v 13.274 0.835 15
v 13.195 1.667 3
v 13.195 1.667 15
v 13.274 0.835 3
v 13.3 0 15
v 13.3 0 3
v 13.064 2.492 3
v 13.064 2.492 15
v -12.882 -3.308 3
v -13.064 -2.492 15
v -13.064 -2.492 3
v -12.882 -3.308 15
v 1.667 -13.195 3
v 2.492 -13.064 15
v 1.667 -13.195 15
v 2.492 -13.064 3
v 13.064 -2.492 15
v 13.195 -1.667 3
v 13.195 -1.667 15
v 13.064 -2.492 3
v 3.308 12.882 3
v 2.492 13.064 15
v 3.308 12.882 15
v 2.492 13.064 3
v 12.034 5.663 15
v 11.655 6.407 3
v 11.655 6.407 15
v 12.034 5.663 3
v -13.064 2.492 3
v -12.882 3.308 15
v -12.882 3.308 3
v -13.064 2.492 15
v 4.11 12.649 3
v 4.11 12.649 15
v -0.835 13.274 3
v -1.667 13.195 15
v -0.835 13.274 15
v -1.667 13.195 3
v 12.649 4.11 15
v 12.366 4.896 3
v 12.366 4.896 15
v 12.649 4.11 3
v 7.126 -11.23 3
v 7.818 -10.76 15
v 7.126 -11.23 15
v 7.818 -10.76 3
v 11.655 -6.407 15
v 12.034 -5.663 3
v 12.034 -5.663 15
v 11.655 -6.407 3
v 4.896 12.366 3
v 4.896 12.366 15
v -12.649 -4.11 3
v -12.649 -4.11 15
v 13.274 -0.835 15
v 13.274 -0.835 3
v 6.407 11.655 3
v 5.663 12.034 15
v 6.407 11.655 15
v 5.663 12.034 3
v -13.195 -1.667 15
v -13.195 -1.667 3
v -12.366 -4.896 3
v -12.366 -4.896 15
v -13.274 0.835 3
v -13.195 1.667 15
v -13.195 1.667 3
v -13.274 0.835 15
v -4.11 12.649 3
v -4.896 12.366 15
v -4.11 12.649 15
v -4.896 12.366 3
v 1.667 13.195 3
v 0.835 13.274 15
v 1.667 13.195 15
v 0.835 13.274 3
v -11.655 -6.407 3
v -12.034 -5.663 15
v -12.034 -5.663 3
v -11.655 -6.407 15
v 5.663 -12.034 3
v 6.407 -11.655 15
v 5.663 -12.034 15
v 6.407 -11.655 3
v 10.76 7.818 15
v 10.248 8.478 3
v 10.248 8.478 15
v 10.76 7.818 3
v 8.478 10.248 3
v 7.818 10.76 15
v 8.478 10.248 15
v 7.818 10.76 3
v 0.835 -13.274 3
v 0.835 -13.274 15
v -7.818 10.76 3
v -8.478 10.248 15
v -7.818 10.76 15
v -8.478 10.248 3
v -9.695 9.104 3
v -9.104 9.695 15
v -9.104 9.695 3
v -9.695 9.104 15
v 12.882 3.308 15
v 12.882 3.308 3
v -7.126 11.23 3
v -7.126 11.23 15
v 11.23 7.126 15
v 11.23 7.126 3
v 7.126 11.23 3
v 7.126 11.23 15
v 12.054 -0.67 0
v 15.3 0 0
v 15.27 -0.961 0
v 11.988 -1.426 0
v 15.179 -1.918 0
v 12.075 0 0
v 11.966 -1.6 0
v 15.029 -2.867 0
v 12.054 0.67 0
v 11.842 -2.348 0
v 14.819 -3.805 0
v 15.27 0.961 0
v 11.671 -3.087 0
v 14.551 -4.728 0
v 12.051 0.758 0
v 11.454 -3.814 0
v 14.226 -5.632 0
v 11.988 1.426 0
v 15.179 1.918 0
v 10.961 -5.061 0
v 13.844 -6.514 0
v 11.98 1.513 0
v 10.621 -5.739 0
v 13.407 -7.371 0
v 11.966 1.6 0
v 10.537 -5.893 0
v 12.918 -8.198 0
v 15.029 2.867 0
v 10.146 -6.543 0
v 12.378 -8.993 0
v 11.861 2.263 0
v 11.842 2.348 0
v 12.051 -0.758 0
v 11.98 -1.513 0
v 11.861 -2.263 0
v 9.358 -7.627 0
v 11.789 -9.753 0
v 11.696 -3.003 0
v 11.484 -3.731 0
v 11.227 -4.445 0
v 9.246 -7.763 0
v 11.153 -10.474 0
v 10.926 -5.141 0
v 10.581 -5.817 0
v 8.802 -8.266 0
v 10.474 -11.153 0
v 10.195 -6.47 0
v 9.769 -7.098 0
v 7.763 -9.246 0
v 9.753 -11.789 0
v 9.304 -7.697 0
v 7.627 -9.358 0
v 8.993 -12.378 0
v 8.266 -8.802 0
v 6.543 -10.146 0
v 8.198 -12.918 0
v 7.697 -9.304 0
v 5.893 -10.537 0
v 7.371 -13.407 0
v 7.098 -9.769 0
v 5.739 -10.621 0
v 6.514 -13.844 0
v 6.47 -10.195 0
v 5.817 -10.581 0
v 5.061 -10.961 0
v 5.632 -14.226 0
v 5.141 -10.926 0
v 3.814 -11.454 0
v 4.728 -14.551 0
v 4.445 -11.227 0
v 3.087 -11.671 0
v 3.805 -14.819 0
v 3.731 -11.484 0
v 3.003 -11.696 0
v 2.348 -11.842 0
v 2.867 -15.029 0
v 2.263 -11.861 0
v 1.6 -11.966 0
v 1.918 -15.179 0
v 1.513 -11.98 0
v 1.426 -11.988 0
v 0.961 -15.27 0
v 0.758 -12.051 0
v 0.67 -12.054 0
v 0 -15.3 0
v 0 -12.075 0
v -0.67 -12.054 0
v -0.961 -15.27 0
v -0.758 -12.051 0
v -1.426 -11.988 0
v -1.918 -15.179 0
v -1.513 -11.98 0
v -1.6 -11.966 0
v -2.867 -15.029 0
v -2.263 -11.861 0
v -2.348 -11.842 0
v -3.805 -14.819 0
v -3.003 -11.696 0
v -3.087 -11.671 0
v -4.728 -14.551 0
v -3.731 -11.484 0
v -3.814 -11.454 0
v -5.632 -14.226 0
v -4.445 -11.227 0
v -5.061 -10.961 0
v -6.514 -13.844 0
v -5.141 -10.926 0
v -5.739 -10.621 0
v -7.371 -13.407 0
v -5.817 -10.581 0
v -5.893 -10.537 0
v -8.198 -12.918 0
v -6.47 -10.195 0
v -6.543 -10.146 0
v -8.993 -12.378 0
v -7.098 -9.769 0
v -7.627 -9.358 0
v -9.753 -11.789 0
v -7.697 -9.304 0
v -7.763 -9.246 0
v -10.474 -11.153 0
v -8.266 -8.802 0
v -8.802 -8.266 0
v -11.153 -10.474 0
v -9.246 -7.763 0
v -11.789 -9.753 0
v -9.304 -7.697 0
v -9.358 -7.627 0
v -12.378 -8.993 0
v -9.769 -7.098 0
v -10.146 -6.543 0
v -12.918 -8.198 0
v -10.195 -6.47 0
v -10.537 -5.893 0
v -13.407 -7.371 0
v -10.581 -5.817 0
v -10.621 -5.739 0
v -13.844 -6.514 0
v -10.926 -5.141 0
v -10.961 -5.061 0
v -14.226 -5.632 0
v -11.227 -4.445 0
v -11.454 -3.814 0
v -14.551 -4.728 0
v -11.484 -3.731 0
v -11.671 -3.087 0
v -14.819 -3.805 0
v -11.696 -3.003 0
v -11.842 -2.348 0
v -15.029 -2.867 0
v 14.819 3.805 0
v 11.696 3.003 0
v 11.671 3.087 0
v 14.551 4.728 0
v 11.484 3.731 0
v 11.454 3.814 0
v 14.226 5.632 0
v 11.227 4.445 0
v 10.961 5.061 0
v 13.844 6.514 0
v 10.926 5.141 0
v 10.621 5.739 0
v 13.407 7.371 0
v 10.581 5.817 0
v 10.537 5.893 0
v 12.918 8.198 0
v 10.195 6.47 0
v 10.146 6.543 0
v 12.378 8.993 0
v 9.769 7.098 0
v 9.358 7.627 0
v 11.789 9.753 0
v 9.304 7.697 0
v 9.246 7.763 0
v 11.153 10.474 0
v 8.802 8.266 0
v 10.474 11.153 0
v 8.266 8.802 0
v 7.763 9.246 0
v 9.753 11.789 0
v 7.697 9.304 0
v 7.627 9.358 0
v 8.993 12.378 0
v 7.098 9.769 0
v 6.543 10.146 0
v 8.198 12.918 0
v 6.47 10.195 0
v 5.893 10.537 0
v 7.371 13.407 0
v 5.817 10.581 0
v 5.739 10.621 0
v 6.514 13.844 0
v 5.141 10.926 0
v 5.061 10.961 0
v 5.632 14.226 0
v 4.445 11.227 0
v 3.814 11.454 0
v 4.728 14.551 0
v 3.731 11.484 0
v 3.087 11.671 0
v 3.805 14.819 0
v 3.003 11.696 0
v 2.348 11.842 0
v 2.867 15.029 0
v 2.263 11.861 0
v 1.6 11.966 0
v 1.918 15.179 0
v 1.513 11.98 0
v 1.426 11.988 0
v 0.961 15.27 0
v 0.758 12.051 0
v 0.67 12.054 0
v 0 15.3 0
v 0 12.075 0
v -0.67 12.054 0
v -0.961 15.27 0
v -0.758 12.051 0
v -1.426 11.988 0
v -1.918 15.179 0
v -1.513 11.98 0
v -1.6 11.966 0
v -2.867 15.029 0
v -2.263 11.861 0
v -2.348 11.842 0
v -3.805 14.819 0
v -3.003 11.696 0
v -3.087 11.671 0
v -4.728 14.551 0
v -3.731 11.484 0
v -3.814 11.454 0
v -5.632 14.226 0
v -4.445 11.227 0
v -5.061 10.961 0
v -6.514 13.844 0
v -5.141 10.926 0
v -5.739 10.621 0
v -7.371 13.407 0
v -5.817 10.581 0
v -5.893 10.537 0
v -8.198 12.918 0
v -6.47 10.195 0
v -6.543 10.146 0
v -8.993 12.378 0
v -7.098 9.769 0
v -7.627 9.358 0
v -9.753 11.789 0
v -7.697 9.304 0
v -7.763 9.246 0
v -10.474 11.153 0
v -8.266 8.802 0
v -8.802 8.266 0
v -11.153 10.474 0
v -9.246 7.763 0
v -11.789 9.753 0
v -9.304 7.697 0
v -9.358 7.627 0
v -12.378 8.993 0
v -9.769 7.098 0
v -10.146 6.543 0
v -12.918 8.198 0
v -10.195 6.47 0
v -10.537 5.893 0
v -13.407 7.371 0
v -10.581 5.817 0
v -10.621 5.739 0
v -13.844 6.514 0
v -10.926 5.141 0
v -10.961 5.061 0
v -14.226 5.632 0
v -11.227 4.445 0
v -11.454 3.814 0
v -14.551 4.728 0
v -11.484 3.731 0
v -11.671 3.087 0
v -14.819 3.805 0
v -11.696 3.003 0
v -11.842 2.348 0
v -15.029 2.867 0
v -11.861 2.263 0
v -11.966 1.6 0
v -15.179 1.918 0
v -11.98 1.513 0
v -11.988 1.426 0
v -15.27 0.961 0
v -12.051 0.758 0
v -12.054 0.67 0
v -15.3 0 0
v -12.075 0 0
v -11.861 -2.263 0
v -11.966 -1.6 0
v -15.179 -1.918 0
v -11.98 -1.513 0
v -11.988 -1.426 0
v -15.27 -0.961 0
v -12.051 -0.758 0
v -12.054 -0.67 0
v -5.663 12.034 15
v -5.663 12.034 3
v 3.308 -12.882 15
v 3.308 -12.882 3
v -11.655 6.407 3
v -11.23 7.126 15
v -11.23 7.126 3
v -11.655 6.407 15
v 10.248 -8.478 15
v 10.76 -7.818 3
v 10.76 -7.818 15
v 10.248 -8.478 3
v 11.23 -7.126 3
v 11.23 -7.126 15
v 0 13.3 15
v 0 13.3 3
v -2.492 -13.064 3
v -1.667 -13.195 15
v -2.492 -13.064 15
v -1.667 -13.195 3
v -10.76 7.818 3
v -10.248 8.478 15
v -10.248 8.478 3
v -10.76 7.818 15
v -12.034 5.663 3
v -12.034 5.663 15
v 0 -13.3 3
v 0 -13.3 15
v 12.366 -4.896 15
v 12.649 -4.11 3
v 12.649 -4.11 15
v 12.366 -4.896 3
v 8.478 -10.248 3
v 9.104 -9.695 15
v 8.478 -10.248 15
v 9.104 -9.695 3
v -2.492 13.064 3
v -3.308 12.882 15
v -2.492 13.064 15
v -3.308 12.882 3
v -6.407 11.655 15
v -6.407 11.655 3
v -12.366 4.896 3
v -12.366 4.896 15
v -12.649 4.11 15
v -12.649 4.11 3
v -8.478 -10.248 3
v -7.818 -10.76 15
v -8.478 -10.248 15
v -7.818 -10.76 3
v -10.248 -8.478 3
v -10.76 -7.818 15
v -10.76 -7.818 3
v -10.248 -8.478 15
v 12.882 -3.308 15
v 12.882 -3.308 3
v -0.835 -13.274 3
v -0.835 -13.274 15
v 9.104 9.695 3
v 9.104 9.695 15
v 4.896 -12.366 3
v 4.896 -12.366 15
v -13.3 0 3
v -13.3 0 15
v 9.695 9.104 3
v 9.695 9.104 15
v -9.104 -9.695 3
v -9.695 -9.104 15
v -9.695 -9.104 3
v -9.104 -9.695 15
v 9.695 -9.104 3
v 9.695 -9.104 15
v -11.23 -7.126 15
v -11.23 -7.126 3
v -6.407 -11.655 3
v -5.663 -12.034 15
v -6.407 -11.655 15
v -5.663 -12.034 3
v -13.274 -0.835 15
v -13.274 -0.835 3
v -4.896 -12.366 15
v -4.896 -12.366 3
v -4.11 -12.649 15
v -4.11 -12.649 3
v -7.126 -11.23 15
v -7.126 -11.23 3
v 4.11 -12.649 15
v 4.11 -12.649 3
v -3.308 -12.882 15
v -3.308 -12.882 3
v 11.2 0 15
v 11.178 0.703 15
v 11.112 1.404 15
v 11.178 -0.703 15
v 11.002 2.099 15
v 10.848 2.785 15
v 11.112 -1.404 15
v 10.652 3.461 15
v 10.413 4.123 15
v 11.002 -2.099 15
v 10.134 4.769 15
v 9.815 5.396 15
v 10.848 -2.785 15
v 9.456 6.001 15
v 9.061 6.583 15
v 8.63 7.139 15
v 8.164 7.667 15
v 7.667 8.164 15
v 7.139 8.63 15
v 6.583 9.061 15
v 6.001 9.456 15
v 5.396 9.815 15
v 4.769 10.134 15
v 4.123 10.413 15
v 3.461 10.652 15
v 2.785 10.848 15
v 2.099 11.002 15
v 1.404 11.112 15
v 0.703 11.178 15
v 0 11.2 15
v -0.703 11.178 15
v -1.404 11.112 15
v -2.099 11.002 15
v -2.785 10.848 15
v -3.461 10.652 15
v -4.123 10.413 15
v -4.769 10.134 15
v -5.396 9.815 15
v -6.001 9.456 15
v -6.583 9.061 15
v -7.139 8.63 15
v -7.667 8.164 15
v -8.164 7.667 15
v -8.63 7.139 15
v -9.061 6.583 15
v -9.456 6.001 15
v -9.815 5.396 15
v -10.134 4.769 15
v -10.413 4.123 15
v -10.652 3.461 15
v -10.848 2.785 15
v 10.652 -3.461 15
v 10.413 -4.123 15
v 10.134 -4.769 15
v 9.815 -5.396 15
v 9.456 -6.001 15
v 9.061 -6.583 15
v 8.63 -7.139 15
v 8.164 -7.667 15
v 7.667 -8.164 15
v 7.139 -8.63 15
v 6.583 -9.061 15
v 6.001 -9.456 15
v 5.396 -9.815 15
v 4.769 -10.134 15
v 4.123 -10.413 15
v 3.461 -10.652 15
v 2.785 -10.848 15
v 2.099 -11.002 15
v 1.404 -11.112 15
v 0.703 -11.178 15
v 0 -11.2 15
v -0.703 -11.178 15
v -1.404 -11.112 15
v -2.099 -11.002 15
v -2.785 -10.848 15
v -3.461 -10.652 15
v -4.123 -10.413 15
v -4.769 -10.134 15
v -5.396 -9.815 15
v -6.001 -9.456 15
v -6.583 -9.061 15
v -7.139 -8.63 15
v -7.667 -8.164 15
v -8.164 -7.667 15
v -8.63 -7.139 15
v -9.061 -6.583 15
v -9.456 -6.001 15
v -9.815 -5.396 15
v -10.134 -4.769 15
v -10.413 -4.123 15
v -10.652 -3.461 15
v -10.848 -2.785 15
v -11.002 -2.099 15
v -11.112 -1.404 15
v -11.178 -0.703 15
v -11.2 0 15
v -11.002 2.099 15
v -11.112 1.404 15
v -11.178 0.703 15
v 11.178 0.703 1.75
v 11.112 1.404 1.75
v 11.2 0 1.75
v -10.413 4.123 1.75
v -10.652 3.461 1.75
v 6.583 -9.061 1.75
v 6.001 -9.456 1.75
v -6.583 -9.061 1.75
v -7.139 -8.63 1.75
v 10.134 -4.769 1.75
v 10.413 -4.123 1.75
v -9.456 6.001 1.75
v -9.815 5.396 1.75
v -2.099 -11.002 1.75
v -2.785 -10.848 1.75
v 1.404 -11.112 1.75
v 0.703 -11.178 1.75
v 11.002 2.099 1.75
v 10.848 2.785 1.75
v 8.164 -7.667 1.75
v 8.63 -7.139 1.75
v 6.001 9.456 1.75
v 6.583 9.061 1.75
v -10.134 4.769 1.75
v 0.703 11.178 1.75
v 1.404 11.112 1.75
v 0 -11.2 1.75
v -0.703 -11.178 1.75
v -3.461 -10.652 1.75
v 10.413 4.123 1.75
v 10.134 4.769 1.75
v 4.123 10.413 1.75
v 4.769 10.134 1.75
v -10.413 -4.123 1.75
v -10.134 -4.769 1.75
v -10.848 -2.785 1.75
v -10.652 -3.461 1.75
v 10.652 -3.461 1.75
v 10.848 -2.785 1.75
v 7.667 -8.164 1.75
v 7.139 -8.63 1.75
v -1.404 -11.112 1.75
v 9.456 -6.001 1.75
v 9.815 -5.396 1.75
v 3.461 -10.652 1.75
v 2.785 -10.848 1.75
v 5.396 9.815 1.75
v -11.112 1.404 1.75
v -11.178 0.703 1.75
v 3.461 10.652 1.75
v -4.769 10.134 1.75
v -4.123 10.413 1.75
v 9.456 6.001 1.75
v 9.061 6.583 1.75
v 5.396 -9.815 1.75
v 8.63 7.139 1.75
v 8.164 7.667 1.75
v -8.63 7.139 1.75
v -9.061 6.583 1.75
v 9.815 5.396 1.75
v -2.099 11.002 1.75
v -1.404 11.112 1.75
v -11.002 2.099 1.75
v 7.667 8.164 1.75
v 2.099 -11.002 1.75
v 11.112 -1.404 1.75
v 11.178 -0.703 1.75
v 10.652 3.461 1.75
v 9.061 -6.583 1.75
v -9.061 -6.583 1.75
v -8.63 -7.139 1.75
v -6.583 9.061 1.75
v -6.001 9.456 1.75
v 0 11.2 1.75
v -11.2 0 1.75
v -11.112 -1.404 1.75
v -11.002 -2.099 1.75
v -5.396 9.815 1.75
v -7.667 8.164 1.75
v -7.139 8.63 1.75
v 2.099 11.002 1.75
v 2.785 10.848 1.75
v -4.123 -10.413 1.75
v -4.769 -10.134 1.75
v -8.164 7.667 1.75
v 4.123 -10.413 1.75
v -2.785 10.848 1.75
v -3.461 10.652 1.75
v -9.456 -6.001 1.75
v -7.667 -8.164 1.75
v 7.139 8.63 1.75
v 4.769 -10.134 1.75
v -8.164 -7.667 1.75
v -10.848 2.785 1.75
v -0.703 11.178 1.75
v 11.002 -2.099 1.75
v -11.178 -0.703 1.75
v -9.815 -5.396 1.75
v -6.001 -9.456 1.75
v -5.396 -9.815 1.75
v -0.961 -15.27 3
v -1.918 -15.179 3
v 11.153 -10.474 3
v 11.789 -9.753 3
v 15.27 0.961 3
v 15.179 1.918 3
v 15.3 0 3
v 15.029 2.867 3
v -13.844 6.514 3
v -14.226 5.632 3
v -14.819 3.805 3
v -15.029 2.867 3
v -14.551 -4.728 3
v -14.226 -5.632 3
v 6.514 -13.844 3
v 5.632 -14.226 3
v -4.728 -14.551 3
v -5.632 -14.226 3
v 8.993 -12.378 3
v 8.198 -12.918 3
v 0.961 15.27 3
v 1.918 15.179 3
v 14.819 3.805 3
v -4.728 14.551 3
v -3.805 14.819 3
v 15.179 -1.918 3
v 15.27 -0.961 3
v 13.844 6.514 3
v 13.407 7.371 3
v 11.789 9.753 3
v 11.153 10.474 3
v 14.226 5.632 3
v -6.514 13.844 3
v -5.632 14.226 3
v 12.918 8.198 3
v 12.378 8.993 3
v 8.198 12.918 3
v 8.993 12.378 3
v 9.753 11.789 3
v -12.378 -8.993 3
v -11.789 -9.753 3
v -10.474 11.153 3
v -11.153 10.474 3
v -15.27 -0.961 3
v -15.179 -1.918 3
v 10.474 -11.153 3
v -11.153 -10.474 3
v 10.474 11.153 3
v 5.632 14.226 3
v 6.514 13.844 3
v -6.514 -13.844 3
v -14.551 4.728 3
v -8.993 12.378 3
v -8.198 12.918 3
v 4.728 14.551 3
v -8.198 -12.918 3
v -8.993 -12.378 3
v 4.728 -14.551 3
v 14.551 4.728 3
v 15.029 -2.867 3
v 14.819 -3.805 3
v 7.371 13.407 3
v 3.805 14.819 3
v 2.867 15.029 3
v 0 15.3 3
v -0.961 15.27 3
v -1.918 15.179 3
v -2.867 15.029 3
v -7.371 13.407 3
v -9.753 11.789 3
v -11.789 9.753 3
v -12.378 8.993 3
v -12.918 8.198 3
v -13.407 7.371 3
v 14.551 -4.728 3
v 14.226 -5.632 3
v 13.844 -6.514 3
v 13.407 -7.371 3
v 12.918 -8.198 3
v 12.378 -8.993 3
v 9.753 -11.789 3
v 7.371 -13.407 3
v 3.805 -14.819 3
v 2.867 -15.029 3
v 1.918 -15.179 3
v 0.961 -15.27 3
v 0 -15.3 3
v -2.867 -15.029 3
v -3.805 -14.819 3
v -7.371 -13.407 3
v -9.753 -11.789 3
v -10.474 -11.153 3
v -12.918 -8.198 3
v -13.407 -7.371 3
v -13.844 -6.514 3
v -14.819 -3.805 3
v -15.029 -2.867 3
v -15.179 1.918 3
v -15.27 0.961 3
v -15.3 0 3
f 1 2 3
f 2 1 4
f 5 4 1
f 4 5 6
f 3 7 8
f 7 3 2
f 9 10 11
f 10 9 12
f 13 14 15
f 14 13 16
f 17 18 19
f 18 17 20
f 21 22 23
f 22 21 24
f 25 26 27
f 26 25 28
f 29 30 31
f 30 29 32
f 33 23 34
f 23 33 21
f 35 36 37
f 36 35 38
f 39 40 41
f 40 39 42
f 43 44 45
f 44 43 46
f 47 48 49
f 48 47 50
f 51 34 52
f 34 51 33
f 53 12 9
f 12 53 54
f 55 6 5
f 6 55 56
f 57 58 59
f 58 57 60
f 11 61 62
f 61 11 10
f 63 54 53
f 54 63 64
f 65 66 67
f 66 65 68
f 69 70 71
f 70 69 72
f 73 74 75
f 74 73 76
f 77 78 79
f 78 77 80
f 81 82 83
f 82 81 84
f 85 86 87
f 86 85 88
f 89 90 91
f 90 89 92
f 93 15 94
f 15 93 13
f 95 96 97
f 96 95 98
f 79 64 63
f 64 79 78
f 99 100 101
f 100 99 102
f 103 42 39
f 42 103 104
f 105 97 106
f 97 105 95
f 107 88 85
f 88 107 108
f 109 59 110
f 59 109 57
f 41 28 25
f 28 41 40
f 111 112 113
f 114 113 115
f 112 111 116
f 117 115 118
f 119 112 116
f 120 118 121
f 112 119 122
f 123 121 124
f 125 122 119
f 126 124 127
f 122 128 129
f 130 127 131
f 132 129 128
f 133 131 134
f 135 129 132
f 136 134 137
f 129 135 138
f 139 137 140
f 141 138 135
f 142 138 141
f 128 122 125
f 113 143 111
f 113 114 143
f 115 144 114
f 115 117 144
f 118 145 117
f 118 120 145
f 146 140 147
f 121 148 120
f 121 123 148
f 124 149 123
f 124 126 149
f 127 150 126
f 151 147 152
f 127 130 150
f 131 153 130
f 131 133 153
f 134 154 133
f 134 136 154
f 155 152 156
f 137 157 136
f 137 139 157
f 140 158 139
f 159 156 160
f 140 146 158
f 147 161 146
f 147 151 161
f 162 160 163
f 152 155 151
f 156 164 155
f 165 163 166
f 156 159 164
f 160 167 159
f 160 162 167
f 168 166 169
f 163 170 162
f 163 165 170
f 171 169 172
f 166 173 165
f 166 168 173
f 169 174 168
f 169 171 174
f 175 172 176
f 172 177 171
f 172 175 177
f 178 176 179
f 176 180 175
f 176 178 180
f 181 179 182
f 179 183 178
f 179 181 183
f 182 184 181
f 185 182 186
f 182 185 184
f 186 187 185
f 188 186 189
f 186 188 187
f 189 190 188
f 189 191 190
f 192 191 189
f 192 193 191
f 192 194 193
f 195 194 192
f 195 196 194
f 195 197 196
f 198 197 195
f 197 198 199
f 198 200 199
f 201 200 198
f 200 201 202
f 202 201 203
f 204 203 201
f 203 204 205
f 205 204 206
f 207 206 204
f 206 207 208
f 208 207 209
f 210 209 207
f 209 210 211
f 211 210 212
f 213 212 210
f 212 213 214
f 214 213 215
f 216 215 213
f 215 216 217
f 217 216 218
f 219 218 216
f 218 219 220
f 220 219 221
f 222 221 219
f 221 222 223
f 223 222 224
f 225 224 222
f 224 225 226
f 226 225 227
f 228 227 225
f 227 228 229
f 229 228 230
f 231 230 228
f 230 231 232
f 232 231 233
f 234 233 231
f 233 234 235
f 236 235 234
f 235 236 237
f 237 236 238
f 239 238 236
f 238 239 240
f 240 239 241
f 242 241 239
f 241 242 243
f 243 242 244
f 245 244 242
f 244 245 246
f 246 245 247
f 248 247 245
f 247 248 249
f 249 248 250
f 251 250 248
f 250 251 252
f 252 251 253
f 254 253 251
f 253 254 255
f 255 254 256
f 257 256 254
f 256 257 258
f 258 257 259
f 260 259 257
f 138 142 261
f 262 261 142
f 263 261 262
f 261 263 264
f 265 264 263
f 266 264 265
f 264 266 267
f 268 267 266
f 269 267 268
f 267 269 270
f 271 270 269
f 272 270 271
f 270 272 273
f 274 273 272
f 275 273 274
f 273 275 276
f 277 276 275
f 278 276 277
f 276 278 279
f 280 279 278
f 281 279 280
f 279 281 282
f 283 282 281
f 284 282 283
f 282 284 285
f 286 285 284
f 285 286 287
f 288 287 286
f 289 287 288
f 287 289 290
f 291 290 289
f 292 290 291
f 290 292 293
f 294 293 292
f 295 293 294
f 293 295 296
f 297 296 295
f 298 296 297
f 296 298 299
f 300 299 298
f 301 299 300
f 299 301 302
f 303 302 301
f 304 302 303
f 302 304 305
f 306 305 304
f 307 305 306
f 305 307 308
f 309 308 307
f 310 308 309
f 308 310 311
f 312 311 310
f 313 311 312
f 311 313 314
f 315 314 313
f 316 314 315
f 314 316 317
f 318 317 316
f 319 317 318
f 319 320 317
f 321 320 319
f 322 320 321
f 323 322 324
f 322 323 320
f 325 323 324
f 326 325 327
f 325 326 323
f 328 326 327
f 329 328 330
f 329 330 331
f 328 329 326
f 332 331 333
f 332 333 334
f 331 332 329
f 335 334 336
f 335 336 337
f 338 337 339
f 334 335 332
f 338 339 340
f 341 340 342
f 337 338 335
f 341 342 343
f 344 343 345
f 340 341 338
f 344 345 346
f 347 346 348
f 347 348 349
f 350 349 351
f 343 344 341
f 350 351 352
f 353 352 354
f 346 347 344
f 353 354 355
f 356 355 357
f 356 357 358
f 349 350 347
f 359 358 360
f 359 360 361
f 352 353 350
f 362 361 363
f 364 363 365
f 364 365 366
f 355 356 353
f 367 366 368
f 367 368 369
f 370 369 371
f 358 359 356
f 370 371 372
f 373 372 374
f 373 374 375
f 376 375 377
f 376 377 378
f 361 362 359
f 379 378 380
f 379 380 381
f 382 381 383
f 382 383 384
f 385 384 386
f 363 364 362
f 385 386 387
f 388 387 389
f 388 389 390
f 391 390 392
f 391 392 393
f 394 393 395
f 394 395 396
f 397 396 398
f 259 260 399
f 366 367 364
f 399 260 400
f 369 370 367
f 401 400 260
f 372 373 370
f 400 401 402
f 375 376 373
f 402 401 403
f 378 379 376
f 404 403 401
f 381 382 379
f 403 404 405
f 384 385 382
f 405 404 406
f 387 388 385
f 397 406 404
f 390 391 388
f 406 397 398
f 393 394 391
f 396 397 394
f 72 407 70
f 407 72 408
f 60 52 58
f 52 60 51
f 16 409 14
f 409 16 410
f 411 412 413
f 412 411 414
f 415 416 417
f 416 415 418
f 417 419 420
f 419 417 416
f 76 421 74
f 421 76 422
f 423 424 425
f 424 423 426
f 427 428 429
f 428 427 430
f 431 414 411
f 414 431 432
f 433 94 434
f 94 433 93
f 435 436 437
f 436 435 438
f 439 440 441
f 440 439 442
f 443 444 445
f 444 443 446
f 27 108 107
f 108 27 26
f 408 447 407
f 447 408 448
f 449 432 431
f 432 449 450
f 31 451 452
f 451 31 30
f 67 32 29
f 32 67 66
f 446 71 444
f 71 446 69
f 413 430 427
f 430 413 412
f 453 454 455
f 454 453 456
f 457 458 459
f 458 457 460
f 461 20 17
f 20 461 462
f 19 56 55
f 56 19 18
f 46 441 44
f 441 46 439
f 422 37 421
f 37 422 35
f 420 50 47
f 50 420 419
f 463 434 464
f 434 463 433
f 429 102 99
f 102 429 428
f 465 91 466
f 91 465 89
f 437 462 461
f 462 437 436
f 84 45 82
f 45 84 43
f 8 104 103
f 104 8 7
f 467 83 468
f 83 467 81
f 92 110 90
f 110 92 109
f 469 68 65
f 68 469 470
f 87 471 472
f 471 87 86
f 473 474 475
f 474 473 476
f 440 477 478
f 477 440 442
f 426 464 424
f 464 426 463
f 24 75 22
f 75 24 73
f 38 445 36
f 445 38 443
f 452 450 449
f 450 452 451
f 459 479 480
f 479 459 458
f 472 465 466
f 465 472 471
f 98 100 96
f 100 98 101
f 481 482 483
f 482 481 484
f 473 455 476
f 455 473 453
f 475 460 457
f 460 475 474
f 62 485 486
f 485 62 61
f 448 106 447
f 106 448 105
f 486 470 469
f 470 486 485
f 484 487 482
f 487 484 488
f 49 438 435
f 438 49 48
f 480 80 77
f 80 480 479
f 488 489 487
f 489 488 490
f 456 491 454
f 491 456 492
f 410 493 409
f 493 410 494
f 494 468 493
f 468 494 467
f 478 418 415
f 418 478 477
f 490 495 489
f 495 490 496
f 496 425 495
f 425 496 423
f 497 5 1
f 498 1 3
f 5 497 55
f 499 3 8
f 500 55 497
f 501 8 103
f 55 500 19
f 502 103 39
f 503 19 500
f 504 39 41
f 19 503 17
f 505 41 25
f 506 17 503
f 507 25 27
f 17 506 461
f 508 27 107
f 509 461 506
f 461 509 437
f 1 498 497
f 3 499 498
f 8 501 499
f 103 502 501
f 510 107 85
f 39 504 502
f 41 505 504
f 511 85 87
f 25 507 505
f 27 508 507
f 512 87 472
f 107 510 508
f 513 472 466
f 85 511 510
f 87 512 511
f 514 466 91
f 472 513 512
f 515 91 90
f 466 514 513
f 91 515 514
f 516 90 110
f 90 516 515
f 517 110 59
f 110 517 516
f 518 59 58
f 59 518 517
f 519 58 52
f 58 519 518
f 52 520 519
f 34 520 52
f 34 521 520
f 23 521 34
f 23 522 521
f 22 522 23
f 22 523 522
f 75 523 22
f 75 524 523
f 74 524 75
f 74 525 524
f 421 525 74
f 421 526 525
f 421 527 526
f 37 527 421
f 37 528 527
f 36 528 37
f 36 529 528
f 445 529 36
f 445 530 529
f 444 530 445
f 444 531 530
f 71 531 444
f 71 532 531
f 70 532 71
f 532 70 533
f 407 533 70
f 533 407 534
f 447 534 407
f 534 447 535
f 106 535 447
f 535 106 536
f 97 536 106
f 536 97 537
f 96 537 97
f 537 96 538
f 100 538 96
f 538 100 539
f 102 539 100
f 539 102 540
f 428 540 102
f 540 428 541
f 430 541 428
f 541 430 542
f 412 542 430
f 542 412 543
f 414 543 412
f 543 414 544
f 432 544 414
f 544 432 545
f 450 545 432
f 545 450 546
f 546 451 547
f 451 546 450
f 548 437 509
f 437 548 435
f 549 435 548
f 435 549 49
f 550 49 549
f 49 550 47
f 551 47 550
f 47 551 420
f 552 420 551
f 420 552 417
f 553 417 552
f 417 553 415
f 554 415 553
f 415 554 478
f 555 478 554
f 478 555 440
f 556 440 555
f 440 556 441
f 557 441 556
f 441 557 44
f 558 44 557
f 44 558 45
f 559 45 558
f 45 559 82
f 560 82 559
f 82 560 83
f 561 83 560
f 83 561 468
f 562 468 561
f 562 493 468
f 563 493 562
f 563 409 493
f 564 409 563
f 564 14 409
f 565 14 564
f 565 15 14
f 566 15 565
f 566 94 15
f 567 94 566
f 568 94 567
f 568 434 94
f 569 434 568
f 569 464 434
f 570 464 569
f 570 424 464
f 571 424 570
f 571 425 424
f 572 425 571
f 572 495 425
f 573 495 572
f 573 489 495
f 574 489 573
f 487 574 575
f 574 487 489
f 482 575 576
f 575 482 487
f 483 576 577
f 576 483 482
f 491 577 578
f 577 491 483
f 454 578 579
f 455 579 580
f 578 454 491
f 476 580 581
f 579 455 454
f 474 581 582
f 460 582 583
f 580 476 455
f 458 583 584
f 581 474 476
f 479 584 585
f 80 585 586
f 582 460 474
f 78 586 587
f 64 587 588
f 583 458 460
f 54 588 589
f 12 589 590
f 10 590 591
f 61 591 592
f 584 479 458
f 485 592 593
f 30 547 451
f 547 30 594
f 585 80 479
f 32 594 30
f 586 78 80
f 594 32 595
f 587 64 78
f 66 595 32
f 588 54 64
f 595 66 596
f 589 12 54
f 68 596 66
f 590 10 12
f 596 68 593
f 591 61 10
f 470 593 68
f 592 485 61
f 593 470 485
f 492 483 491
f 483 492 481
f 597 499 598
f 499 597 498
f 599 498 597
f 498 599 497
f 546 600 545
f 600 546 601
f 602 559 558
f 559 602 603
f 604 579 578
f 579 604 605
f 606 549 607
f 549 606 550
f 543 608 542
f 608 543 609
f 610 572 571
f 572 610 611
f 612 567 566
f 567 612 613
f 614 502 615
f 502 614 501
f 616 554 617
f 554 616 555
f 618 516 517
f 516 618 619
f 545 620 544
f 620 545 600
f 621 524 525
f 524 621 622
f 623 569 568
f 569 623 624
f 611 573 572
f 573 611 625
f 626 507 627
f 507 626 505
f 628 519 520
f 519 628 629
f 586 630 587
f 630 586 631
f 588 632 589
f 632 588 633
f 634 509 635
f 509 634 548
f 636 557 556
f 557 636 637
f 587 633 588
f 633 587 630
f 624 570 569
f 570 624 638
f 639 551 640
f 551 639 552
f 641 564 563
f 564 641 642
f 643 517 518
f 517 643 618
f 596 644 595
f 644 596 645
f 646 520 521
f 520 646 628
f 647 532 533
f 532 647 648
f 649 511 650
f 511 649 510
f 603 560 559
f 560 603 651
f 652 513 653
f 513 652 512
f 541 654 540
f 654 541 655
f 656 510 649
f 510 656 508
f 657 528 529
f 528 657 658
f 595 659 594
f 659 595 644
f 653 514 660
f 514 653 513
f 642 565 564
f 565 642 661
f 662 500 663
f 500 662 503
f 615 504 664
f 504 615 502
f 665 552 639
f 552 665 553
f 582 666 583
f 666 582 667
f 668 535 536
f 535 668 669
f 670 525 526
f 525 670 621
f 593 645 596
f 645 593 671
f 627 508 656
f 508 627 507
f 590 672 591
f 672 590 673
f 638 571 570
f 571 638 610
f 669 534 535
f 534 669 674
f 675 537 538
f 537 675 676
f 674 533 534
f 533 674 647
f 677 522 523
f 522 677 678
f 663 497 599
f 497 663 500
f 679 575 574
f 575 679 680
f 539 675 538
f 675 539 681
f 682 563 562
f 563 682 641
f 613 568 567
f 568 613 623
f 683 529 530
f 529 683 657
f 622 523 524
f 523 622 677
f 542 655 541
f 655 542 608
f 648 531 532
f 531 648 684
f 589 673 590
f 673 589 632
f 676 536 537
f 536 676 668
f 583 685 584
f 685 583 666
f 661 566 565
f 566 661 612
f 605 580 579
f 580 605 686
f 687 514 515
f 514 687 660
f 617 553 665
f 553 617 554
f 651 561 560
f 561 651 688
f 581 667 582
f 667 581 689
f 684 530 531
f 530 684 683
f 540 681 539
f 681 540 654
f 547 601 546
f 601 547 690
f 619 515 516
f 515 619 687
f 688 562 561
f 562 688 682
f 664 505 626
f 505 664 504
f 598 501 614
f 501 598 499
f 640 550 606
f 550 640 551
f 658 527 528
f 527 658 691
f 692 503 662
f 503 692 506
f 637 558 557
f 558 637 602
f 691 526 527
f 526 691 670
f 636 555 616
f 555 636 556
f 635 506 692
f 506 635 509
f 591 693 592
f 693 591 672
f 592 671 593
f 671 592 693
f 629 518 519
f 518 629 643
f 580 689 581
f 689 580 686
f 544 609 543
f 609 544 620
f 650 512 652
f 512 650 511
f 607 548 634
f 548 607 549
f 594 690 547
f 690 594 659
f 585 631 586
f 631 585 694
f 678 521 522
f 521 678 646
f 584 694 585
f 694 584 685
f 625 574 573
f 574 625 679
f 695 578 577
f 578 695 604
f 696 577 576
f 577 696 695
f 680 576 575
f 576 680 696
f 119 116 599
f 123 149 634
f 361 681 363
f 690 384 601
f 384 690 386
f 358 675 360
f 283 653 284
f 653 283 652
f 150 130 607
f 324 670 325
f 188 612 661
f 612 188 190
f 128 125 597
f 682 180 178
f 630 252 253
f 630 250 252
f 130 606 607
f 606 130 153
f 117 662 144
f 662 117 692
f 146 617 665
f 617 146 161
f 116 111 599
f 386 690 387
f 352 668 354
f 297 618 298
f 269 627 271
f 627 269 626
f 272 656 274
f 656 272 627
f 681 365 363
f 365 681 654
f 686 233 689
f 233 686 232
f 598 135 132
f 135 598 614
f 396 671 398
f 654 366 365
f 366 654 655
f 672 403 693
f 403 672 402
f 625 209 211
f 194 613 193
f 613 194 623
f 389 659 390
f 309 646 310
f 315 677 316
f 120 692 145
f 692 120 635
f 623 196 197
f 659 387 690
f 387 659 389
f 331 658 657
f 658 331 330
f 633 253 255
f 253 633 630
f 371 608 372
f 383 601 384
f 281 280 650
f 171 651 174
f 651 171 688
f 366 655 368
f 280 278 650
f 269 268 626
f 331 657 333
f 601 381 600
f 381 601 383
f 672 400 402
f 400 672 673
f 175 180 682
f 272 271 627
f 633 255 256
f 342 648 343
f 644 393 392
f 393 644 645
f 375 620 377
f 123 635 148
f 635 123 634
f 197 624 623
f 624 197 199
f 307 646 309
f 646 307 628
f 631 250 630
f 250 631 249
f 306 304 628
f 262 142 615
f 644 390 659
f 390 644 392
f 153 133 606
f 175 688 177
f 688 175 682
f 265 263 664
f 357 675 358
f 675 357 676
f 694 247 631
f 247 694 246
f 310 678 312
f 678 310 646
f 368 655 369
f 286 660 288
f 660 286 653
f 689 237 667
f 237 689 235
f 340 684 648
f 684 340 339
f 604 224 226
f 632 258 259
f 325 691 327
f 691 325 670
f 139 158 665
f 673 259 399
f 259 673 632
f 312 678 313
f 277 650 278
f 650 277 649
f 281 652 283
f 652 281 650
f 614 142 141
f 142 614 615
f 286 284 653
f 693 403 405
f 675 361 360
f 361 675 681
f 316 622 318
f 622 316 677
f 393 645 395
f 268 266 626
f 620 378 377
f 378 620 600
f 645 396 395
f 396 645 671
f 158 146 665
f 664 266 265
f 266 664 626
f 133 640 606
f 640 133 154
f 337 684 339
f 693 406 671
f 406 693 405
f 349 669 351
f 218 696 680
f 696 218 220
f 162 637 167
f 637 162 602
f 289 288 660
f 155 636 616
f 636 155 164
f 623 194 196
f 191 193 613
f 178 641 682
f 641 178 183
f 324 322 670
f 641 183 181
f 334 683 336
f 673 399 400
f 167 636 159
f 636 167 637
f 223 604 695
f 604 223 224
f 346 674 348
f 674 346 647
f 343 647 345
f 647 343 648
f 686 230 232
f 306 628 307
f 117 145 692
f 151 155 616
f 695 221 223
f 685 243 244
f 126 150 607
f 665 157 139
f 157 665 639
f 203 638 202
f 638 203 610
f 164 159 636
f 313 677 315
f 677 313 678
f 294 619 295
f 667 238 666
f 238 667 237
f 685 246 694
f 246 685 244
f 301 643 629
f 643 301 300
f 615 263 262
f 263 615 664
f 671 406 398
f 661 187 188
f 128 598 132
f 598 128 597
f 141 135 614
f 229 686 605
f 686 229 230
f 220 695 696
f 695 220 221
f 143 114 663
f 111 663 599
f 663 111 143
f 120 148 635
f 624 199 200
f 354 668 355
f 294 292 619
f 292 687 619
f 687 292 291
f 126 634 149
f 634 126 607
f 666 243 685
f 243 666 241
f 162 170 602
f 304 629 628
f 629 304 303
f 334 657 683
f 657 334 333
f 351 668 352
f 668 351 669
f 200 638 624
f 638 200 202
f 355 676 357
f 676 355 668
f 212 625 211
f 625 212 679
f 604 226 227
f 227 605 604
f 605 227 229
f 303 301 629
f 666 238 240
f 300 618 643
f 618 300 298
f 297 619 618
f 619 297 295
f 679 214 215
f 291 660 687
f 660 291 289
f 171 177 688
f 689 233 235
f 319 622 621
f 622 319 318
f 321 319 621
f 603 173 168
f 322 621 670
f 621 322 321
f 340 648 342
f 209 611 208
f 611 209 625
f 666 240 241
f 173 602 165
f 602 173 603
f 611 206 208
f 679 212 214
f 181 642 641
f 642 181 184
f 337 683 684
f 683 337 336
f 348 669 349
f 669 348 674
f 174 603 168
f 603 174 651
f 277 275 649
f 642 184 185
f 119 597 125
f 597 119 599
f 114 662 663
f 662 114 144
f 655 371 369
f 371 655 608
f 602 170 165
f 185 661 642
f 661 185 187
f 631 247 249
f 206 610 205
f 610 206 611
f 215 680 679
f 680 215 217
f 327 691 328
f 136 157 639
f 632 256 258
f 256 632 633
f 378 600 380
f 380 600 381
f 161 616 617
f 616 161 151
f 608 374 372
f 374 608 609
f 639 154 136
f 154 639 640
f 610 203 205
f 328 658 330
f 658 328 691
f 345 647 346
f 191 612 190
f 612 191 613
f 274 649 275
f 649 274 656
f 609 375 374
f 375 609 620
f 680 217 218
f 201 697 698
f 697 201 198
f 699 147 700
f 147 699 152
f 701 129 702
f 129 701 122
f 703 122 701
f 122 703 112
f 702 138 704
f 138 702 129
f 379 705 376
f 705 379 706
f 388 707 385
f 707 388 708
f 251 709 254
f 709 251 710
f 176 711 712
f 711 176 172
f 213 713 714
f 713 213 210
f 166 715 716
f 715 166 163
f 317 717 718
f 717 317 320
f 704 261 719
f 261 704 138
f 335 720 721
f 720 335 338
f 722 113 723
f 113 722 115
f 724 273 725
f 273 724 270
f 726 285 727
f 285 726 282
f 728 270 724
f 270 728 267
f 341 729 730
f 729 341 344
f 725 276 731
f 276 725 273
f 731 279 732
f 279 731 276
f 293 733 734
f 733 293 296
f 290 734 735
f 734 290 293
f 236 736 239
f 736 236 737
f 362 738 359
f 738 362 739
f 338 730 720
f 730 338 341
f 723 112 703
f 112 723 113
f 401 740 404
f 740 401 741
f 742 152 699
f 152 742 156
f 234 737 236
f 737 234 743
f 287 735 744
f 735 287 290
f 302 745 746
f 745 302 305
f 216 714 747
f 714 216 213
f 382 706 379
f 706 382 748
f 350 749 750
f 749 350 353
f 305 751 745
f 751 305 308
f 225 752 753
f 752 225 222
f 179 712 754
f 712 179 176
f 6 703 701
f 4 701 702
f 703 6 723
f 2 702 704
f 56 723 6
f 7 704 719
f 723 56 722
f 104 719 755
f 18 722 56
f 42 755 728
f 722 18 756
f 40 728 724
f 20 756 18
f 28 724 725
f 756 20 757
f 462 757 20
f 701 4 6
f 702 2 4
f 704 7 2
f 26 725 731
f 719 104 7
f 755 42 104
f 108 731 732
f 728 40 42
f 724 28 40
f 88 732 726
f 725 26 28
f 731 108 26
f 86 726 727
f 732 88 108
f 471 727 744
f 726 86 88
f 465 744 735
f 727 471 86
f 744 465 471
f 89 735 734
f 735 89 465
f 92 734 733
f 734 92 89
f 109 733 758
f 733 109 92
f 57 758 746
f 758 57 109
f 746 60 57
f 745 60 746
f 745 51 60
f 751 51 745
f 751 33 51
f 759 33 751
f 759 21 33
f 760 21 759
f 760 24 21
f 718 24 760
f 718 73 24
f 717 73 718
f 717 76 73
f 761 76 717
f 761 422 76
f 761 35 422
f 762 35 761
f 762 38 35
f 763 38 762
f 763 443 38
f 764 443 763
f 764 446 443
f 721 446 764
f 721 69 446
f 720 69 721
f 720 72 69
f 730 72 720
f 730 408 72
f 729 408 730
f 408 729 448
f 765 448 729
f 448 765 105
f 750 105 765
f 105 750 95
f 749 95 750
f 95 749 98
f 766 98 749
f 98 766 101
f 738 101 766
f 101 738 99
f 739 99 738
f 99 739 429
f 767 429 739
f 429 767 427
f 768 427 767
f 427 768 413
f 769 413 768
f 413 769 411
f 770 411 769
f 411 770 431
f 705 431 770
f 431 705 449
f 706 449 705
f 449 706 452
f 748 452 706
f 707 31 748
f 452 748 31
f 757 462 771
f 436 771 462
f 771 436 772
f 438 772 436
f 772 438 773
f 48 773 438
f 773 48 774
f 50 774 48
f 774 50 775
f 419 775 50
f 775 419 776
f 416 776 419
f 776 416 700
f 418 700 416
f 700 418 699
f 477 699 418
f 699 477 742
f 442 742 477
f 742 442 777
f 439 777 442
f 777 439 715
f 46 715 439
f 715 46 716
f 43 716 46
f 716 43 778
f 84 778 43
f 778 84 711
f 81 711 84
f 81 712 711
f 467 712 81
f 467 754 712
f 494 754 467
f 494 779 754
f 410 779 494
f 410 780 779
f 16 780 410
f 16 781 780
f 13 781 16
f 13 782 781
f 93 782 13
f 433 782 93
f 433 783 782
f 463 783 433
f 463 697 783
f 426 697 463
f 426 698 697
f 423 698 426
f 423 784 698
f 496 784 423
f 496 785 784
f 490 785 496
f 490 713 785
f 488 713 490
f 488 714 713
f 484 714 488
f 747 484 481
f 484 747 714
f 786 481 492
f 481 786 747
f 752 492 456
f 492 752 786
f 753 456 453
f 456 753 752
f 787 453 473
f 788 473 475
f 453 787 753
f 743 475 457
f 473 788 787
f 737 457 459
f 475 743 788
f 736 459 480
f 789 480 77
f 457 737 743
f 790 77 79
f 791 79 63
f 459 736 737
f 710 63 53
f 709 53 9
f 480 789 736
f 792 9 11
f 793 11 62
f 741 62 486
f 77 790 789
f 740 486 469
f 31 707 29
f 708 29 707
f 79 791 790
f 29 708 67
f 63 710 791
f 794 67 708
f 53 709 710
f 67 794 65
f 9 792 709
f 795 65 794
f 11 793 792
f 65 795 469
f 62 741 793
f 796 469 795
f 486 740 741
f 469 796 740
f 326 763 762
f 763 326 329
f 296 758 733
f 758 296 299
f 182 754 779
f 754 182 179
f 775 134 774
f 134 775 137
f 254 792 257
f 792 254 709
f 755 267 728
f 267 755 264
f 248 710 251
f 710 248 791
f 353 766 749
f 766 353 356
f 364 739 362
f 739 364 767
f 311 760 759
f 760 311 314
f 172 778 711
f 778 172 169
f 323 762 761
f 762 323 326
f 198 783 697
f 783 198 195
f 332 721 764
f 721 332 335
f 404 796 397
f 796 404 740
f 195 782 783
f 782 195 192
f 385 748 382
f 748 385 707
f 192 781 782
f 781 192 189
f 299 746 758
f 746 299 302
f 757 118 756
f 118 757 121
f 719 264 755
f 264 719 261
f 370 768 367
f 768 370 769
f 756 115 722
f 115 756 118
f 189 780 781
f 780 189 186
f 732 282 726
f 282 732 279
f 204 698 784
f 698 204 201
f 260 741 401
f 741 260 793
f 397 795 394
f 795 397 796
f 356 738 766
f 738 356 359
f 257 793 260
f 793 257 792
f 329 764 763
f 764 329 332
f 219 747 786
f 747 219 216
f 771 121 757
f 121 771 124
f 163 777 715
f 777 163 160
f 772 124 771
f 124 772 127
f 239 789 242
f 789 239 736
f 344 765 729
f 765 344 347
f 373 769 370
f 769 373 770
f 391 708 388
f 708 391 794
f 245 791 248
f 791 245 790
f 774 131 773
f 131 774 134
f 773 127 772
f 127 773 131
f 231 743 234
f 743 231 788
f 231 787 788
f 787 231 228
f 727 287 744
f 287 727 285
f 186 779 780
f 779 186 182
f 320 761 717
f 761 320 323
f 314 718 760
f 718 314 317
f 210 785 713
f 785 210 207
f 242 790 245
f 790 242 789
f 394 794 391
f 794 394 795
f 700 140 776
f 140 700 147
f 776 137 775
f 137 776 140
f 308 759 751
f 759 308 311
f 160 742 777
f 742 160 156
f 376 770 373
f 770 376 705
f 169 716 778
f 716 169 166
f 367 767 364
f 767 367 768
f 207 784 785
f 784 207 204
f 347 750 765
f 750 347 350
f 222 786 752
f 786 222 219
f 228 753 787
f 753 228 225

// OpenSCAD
//pipe to smaller pipe adapter


$fn=100;

OPR=13.30;  //enter pvc pipe inner radius here (for standard 1" PVC, outer part radius OPR=13.30, for 32mm OPR=13.4)
IPR=11.2;   //for 3/4" CPVC inner part radius IPR=11.20

difference () {
    cylinder(15,OPR,OPR);
    translate([0,0,-1]) cylinder(25,IPR,IPR);
    translate ([0,0,-0.25]) cylinder (2,IPR+1,IPR);
    }

difference () {
    cylinder(3,OPR+2,OPR+2);
    translate([0,0,-1]) cylinder(25,IPR,IPR);
    translate ([0,0,-0.25]) cylinder (2,IPR+1,IPR);
    }
